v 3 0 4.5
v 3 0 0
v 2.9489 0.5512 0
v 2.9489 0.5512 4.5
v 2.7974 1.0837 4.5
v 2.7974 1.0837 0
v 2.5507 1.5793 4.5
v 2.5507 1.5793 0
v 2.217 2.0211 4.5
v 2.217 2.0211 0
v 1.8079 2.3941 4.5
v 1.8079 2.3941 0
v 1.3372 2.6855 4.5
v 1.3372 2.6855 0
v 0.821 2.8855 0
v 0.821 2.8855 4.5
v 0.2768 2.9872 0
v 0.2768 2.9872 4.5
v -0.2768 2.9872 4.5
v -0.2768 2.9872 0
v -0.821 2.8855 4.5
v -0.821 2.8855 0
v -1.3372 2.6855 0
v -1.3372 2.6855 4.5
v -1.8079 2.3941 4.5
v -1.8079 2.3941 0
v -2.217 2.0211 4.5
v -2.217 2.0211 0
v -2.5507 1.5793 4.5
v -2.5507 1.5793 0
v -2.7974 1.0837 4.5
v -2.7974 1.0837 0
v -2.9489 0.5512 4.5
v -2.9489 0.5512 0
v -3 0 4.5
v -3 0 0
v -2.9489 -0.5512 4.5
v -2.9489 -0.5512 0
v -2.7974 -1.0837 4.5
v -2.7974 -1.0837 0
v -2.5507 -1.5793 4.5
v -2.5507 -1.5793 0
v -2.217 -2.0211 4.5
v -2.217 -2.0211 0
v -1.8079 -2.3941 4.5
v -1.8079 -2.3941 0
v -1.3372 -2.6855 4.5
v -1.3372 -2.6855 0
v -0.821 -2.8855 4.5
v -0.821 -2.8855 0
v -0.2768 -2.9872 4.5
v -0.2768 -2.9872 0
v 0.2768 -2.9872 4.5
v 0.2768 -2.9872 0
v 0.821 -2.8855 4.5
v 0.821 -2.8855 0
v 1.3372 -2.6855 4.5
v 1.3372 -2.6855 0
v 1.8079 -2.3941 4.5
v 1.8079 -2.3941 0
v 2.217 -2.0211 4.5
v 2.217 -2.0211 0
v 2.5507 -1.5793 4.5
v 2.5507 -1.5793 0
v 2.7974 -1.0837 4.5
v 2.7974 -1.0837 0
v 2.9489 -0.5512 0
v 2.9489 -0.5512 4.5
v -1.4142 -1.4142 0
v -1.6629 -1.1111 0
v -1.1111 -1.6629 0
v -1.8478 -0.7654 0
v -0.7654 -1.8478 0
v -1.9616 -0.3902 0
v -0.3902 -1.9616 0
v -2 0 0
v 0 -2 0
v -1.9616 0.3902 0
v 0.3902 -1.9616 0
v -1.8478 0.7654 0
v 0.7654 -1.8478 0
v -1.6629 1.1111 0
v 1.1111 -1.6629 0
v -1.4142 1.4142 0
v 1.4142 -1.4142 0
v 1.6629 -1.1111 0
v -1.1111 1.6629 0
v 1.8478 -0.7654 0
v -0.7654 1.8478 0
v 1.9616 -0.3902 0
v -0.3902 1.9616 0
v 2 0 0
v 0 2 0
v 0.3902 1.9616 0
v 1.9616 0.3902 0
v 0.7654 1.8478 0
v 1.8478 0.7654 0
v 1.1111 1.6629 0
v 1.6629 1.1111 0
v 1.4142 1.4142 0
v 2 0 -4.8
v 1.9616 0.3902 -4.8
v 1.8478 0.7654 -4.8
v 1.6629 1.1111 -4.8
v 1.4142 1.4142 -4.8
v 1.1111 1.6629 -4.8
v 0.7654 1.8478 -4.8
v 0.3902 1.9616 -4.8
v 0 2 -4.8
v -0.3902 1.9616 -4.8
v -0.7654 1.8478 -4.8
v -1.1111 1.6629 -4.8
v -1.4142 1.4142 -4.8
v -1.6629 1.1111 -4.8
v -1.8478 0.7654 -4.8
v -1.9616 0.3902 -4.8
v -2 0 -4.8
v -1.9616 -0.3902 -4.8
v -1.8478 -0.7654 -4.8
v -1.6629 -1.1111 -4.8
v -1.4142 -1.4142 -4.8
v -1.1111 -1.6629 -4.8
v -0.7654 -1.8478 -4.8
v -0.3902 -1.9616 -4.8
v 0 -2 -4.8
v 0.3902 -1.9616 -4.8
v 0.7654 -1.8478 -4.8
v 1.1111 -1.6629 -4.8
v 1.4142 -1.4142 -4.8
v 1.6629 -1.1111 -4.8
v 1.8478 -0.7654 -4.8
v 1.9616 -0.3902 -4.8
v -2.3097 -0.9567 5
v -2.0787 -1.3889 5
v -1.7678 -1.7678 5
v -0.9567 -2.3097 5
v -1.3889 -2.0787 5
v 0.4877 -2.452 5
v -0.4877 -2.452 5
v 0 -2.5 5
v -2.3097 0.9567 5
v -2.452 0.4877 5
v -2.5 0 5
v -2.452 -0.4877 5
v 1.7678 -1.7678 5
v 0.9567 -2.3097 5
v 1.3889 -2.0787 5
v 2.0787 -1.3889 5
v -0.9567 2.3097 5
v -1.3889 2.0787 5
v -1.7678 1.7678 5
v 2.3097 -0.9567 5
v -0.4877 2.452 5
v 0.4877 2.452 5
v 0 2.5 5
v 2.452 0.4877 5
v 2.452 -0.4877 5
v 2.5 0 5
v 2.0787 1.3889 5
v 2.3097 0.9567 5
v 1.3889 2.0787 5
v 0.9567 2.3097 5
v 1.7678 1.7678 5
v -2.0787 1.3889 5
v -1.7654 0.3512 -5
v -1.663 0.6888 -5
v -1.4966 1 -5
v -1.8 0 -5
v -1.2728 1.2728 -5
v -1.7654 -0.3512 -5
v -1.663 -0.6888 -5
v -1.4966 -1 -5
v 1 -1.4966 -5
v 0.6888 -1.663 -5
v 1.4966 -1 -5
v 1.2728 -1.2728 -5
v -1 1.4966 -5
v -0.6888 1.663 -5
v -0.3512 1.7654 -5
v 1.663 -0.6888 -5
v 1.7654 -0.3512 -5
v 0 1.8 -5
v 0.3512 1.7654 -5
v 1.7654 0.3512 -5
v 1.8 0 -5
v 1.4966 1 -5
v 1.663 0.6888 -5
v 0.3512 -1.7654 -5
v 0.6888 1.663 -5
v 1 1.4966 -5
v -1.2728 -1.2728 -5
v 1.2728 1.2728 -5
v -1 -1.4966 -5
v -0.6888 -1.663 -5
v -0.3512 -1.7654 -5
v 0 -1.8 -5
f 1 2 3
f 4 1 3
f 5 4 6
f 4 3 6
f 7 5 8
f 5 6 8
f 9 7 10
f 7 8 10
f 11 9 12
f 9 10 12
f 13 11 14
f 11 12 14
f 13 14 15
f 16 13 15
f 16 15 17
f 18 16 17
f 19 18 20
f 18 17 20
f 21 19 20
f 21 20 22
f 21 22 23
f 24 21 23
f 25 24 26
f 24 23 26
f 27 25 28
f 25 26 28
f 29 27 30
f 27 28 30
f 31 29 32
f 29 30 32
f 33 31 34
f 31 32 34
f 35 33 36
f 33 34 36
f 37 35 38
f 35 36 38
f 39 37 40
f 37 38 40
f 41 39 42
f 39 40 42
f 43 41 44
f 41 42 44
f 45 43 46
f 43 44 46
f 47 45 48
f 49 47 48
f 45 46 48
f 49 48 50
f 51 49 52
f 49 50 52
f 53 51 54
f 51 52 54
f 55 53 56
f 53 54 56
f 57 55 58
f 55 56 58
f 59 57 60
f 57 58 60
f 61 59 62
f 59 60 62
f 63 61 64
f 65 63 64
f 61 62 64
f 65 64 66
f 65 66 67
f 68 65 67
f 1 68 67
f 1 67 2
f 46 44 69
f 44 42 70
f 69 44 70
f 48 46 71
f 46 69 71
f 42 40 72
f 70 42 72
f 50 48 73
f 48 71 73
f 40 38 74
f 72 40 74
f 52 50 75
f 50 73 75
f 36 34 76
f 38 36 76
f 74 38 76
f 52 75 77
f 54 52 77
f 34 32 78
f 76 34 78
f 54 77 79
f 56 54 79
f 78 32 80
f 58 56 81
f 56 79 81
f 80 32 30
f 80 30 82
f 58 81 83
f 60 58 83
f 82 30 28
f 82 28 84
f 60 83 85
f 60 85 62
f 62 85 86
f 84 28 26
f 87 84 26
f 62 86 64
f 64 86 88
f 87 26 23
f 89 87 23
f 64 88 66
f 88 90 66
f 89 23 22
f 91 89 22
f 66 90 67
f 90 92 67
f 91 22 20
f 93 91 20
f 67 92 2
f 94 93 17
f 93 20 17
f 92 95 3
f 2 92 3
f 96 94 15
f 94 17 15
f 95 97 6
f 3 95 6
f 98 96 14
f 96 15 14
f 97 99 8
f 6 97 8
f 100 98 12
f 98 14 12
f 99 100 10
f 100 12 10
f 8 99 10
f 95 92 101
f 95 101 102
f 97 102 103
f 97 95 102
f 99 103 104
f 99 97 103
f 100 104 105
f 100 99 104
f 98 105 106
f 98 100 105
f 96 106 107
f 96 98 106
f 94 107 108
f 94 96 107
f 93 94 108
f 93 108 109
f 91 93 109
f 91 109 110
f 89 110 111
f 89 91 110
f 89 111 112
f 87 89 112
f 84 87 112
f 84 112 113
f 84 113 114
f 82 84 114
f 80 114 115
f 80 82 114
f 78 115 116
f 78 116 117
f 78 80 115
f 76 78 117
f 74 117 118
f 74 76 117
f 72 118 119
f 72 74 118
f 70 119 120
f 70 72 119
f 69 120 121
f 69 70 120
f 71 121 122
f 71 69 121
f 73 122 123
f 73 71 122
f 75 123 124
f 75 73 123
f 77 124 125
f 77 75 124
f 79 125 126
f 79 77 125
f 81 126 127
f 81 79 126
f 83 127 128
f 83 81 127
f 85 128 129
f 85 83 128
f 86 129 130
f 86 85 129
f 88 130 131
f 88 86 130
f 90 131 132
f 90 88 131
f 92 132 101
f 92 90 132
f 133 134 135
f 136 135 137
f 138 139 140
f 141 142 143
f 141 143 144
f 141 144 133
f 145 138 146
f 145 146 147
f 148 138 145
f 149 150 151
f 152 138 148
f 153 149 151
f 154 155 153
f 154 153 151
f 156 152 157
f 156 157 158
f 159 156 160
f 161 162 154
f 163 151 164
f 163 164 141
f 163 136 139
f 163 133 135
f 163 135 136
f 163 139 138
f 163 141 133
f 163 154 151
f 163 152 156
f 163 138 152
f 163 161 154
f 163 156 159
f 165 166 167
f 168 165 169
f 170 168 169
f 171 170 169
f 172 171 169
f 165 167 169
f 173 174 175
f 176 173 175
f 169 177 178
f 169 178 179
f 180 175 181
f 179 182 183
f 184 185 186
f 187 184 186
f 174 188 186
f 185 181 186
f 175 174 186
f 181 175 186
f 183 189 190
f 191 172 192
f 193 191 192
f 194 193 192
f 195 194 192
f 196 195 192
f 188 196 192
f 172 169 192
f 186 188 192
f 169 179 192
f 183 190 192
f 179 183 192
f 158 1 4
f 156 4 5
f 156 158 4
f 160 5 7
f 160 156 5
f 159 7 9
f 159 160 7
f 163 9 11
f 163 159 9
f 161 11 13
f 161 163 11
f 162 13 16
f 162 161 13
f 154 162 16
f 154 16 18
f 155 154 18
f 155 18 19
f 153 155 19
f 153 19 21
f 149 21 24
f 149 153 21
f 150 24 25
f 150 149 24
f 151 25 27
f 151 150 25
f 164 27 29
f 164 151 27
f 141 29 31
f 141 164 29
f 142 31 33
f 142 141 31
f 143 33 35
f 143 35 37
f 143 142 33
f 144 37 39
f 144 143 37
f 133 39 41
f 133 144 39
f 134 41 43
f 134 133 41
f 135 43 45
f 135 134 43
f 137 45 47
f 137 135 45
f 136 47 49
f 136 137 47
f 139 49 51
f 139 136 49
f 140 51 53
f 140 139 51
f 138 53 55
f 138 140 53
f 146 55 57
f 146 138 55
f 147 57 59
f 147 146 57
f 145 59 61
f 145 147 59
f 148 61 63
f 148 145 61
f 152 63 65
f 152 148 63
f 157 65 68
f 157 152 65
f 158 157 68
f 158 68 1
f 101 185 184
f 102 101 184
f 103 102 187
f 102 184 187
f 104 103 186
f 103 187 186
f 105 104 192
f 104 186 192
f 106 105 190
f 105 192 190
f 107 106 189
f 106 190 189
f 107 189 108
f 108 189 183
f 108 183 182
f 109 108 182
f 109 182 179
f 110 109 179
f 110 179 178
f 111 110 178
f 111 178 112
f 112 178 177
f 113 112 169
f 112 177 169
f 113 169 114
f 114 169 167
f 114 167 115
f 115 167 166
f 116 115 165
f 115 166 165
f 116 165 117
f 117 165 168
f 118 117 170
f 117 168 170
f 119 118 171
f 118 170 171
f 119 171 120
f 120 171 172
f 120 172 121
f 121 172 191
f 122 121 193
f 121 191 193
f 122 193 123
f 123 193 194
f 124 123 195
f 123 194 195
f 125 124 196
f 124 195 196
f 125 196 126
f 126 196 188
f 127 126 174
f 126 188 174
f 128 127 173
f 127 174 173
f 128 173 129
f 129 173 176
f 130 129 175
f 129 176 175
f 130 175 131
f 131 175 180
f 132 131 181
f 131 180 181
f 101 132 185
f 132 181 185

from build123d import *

# Parameters (mm, degrees)
F0_R     = 3
F1_DEPTH = 5
F2_R     = 2
F3_DEPTH = 5
F4_SIZE  = 0.5
F5_SIZE  = 0.2


with BuildPart() as f1:
    # F0 (on Top) → F1 (new body)
    with BuildSketch(Plane.XY):
        Circle(F0_R)
    extrude(amount=F1_DEPTH)

    # F2 (on Top) → F3 (join)
    with BuildSketch(Plane.XY):
        Circle(F2_R)
    extrude(amount=-F3_DEPTH)

    # F4
    f4_edges = [f1.edges().sort_by_distance(p)[0] for p in [
        (-3, 0, 5),
    ]]
    chamfer(f4_edges, length=F4_SIZE)

    # F5
    f5_edges = [f1.edges().sort_by_distance(p)[0] for p in [
        (-2, 0, -5),
    ]]
    chamfer(f5_edges, length=F5_SIZE)


solid = f1.part
